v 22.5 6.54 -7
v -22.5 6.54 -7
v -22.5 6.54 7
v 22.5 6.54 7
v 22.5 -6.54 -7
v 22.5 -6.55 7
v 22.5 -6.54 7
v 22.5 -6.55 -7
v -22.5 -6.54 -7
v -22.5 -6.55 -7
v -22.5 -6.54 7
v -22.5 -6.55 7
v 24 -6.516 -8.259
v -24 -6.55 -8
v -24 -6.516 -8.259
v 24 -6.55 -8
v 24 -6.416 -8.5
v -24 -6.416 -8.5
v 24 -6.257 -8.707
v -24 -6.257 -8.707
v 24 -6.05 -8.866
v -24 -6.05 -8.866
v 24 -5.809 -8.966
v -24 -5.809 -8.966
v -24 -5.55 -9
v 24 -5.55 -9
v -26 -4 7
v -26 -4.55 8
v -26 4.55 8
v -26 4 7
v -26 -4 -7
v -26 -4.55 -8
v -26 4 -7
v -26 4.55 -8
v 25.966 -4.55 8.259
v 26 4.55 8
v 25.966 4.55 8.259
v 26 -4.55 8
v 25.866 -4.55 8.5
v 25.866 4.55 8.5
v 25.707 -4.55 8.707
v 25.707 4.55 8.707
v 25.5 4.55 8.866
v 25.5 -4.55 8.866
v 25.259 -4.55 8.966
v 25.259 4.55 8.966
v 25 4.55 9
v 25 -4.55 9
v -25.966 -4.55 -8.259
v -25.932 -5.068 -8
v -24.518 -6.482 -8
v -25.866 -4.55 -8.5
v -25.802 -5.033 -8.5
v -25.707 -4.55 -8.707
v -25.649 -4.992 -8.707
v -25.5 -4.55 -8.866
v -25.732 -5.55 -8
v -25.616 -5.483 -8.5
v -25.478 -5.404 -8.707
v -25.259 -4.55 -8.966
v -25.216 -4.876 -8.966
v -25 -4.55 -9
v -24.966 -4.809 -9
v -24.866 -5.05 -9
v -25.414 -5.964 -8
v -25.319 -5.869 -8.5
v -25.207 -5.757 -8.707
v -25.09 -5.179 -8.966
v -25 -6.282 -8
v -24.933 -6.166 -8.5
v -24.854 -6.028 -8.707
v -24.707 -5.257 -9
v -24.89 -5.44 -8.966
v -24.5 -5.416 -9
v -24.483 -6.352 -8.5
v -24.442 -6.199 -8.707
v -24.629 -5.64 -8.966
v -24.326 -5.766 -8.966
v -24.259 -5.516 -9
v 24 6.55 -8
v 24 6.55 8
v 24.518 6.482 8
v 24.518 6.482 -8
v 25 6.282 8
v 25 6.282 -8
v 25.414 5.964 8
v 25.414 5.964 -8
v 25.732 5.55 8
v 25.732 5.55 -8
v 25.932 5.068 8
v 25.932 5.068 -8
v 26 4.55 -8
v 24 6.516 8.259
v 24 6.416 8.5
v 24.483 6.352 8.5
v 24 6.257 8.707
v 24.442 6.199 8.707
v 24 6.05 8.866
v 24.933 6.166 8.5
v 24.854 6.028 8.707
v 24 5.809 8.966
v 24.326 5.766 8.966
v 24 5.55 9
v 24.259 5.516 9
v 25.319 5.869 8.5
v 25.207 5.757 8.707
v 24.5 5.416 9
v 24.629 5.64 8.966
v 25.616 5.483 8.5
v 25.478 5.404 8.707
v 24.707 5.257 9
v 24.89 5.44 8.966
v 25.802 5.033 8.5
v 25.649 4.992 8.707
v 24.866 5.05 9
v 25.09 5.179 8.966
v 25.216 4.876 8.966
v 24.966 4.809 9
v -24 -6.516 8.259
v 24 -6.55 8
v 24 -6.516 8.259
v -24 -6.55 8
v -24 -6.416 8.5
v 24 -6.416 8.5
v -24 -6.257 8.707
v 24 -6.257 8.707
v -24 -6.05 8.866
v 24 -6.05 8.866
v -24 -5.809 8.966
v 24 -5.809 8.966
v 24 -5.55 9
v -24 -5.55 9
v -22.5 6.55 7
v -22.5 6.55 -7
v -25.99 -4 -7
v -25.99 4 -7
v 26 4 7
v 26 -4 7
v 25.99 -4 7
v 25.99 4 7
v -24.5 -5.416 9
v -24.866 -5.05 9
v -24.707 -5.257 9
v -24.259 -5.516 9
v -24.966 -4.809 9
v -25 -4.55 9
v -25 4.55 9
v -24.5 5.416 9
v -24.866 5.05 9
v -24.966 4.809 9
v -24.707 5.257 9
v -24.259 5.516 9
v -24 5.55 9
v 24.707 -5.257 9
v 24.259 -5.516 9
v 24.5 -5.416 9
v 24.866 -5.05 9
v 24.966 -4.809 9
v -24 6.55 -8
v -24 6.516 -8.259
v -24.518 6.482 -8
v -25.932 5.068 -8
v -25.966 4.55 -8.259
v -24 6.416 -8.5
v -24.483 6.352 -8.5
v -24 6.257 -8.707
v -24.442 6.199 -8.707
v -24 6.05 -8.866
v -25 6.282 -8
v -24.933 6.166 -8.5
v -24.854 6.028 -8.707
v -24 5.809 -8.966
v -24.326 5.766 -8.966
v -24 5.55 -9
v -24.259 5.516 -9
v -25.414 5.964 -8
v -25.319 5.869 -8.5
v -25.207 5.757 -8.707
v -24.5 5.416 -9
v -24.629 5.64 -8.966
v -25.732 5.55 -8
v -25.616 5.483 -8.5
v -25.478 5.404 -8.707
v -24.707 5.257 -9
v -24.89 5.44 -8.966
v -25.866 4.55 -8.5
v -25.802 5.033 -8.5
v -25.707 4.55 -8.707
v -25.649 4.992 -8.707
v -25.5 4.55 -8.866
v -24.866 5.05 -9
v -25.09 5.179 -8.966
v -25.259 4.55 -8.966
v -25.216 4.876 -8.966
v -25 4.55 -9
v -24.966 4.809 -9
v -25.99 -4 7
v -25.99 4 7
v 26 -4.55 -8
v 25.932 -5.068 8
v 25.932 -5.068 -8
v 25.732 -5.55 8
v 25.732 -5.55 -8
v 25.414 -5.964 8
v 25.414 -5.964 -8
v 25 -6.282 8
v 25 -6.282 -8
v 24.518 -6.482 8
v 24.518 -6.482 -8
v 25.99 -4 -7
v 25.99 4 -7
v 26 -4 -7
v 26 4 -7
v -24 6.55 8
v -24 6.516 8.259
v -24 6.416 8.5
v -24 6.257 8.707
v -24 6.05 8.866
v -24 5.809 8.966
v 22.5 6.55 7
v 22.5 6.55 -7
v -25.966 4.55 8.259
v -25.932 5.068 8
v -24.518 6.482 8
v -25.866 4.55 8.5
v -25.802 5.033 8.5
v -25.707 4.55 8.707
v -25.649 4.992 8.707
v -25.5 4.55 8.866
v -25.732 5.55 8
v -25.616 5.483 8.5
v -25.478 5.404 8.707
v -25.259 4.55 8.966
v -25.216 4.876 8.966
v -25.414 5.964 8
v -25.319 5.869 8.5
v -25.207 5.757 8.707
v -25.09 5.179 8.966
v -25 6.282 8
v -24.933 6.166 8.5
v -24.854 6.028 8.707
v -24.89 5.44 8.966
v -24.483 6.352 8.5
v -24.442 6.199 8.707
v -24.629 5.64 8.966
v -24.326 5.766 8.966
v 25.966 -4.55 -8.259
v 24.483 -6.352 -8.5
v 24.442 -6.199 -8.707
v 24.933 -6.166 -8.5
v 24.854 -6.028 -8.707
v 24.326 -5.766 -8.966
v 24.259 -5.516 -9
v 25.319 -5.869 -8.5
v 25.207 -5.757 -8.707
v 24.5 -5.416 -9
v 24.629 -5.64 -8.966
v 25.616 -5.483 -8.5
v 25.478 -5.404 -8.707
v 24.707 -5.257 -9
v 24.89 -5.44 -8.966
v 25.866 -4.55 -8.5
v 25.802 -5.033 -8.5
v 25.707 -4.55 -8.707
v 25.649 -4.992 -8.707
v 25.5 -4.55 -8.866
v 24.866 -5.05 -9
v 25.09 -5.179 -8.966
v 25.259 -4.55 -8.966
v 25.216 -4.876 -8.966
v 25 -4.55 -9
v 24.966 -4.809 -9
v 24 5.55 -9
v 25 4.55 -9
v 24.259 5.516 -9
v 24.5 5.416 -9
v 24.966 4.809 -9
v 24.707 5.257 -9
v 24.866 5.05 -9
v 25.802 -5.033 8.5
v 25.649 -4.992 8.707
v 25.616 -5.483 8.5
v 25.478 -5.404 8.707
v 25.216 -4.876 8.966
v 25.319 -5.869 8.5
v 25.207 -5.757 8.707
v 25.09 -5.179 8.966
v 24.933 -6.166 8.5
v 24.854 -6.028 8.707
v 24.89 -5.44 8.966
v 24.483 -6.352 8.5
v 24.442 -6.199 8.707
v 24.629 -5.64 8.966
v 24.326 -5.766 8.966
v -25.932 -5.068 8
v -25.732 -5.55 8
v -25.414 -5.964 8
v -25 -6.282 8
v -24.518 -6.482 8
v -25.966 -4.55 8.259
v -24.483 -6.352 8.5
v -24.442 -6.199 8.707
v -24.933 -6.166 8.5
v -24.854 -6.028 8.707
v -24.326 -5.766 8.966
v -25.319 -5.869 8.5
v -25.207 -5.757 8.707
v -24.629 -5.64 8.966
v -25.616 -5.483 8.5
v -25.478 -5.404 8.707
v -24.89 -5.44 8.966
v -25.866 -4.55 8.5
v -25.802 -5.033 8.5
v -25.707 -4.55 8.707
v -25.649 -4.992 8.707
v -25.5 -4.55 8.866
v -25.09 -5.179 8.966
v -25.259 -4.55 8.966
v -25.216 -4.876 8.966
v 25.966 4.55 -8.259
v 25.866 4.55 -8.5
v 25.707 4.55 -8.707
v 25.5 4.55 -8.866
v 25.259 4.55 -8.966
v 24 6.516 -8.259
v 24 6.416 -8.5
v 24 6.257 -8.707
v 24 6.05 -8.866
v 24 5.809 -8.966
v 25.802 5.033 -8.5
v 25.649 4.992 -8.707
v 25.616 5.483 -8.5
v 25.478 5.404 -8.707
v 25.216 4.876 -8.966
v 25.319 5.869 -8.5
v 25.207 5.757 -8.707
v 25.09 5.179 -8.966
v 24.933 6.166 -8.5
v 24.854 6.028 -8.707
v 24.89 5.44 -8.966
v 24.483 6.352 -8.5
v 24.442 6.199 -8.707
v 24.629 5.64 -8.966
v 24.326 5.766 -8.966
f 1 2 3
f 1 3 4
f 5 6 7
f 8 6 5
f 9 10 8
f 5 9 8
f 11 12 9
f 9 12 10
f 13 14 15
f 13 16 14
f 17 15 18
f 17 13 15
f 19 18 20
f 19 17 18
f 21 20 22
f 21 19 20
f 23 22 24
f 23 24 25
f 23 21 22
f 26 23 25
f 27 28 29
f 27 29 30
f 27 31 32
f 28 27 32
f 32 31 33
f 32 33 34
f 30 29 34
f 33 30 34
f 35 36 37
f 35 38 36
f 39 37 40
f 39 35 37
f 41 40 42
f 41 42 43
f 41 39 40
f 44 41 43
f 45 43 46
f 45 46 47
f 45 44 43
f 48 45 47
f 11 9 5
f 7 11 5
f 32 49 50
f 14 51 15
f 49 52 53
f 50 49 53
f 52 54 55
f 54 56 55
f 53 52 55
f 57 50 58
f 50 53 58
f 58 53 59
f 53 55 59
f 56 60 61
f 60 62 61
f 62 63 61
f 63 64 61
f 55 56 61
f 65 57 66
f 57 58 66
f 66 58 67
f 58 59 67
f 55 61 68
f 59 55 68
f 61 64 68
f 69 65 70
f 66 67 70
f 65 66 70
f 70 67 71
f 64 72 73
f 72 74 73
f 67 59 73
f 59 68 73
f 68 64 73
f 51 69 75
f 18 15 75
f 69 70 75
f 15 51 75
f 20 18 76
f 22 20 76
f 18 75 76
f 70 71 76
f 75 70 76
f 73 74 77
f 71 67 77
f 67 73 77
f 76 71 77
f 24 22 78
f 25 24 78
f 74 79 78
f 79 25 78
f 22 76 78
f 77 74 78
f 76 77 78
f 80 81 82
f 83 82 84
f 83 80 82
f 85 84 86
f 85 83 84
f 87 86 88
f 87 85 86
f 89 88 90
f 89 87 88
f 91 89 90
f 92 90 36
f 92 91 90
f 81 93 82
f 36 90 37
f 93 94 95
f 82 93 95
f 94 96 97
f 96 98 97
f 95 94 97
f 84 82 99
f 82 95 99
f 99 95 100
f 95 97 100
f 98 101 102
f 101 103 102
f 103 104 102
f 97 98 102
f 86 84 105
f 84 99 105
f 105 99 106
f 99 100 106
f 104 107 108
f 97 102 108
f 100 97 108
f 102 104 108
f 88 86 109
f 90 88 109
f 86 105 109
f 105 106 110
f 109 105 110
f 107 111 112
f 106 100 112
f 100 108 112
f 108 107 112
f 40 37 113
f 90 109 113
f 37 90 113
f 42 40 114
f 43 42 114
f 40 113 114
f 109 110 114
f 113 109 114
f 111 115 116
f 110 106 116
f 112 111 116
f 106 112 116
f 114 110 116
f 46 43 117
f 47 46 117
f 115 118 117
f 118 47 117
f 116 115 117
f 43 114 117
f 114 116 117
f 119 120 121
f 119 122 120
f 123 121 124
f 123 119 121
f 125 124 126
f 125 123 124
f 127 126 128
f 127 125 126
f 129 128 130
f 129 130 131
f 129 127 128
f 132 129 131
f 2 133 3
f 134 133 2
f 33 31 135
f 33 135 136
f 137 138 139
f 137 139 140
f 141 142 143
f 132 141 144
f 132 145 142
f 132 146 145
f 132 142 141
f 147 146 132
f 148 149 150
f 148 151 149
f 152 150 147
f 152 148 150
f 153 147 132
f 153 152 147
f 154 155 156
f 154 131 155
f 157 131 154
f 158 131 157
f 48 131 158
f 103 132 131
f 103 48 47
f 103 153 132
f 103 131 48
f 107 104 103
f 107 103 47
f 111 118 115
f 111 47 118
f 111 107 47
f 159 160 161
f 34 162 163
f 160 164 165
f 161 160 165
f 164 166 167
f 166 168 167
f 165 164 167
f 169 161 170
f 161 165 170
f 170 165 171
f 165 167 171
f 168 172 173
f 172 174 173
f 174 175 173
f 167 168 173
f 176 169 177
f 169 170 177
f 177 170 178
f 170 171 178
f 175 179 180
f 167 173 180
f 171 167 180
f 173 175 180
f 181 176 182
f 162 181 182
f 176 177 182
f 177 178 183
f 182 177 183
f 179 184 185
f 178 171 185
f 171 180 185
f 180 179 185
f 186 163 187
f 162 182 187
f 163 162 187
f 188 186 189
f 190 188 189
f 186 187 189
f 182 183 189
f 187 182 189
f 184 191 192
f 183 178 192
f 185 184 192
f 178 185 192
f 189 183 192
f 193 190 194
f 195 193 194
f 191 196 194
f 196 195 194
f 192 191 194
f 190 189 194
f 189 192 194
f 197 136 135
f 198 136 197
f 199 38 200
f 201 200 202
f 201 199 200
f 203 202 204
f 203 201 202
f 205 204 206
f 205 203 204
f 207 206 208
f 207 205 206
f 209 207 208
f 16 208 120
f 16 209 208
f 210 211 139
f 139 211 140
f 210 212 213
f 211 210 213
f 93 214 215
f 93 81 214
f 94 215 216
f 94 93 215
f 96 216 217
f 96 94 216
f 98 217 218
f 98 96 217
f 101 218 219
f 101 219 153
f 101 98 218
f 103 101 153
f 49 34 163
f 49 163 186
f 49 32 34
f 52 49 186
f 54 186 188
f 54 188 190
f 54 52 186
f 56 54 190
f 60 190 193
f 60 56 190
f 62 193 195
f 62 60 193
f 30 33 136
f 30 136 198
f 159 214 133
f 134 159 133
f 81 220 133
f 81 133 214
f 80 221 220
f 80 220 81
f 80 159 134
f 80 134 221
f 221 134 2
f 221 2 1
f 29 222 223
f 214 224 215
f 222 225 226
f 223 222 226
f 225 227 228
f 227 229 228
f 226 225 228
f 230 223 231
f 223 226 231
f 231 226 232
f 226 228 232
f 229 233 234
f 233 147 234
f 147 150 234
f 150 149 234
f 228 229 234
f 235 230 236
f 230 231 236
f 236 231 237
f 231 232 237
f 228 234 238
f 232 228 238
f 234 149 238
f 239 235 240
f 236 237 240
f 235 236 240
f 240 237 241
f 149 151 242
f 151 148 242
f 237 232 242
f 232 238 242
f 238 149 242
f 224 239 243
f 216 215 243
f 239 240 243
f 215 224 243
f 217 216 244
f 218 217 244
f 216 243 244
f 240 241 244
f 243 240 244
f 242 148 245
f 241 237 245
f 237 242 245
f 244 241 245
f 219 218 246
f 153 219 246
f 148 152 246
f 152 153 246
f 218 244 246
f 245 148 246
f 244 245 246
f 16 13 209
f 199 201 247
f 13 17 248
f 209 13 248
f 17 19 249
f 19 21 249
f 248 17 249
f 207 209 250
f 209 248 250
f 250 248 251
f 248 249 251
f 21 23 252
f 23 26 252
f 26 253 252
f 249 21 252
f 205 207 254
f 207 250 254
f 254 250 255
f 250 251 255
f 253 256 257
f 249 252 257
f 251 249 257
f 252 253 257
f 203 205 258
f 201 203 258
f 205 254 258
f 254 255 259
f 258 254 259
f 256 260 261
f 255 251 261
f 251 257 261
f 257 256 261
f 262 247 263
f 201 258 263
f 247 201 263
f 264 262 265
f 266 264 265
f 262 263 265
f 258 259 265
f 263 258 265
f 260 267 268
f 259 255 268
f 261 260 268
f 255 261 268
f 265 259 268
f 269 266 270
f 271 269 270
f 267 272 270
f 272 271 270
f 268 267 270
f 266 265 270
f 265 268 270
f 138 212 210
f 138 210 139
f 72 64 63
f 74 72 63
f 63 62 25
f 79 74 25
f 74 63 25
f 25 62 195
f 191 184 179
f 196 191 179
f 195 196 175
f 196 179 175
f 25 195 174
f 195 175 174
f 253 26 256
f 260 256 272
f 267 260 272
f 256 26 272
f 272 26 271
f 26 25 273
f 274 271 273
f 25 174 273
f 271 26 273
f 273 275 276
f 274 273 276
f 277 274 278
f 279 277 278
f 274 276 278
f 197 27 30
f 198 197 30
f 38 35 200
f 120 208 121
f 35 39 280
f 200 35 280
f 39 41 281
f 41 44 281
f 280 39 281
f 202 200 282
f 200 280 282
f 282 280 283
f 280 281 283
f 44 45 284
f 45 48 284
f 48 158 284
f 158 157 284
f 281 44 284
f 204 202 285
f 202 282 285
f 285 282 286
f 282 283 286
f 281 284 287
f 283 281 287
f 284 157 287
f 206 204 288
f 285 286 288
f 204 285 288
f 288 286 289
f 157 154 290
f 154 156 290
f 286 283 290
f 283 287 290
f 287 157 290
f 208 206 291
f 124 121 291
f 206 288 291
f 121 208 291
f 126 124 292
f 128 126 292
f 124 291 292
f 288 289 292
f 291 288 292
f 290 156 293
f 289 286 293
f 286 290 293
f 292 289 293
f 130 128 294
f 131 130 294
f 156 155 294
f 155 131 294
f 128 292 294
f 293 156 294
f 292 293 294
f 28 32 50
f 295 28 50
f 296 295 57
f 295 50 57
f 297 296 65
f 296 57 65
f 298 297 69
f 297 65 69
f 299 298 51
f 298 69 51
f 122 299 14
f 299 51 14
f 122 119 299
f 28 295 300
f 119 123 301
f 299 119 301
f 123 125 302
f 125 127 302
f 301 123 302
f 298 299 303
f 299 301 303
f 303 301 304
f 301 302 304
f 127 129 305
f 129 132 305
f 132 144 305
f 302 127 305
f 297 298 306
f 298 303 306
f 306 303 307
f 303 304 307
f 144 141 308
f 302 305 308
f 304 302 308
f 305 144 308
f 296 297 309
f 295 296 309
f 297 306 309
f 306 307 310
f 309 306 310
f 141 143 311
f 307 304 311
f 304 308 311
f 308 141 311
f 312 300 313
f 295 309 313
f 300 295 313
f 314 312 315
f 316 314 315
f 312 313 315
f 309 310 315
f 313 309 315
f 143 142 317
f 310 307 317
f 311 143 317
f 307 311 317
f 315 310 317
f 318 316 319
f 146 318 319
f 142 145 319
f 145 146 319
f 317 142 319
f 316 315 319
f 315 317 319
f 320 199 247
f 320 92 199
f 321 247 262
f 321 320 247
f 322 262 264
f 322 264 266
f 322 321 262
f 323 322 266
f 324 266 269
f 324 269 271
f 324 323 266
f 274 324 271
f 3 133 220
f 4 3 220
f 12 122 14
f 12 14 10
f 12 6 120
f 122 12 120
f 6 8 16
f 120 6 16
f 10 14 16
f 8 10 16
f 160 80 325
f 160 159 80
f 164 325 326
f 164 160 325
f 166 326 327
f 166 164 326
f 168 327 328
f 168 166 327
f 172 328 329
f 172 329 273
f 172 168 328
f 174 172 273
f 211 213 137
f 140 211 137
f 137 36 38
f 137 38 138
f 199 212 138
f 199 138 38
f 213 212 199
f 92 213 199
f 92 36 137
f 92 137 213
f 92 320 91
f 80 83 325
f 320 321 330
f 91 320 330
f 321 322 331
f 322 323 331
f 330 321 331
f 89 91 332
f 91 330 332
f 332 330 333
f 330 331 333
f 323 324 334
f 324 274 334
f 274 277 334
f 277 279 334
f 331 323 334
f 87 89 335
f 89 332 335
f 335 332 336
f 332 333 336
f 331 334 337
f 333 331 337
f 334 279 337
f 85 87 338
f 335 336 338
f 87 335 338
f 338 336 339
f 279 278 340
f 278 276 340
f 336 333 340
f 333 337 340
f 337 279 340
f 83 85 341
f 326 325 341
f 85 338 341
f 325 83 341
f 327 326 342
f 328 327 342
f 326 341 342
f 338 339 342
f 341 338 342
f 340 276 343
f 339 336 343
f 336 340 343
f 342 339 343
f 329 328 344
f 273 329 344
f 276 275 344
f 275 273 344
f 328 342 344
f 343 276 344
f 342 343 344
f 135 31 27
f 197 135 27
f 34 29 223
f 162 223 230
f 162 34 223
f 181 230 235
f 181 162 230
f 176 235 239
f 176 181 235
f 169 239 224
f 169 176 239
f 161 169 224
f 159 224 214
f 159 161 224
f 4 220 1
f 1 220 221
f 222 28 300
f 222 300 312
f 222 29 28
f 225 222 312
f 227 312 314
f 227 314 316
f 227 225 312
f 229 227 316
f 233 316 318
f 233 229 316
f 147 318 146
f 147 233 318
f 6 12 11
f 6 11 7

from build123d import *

# Parameters (mm, degrees)
SKETCH1_W           = 52
SKETCH1_H           = 18
BOSS_EXTRUDE1_DEPTH = 6.55
FILLET1_R           = 2
FILLET2_R           = 1
SKETCH2_W           = 45
SKETCH2_H           = 14
CUT_EXTRUDE1_DEPTH  = 0.01
SKETCH3_W           = 14
SKETCH3_H           = 8
CUT_EXTRUDE2_DEPTH  = 0.01


with BuildPart() as part:
    # Sketch1 → Boss-Extrude1 (new, symmetric)
    with BuildSketch(Plane(origin=(0, 0, 0), x_dir=(1, 0, 0), z_dir=(0, 1, 0))):
        Rectangle(SKETCH1_W, SKETCH1_H)
    extrude(amount=BOSS_EXTRUDE1_DEPTH, both=True)

    # Fillet1
    fillet1_edges = [part.edges().sort_by_distance(p)[0] for p in [
        (-26, 6.55, 0),
        (26, 6.55, 0),
        (-26, -6.55, 0),
        (26, -6.55, 0),
    ]]
    fillet(fillet1_edges, radius=FILLET1_R)

    # Fillet2
    fillet2_edges = [part.edges().sort_by_distance(p)[0] for p in [
        (-26, 0, 9),
        (-26, 0, -9),
        (0, -6.55, 9),
        (26, 0, 9),
        (0, 6.55, 9),
        (25.414213562, 5.964213562, 9),
        (25.414213562, -5.964213562, 9),
        (-25.414213562, 5.964213562, 9),
        (-25.414213562, -5.964213562, 9),
        (0, -6.55, -9),
        (0, 6.55, -9),
        (26, 0, -9),
        (25.414213562, 5.964213562, -9),
        (25.414213562, -5.964213562, -9),
        (-25.414213562, 5.964213562, -9),
        (-25.414213562, -5.964213562, -9),
    ]]
    fillet(fillet2_edges, radius=FILLET2_R)

    # Sketch2 → Cut-Extrude1 (cut)
    with BuildSketch(Plane(origin=(0, 6.55, 0), x_dir=(1, 0, 0), z_dir=(0, 1, 0))):
        Rectangle(SKETCH2_W, SKETCH2_H)
    cut_extrude1 = extrude(amount=-CUT_EXTRUDE1_DEPTH, mode=Mode.SUBTRACT)

    # Sketch3 → Cut-Extrude2 (cut)
    with BuildSketch(Plane.ZY.offset(26)):
        Rectangle(SKETCH3_W, SKETCH3_H)
    cut_extrude2 = extrude(amount=-CUT_EXTRUDE2_DEPTH, mode=Mode.SUBTRACT)

    # Mirror3: Cut-Extrude1 across plane
    add(cut_extrude1.mirror(Plane.ZX), mode=Mode.SUBTRACT)

    # Mirror4: Cut-Extrude2 across plane
    add(cut_extrude2.mirror(Plane(origin=(0, 0, 0), x_dir=(0, 0, 1), z_dir=(1, 0, 0))), mode=Mode.SUBTRACT)


solid = part.part
